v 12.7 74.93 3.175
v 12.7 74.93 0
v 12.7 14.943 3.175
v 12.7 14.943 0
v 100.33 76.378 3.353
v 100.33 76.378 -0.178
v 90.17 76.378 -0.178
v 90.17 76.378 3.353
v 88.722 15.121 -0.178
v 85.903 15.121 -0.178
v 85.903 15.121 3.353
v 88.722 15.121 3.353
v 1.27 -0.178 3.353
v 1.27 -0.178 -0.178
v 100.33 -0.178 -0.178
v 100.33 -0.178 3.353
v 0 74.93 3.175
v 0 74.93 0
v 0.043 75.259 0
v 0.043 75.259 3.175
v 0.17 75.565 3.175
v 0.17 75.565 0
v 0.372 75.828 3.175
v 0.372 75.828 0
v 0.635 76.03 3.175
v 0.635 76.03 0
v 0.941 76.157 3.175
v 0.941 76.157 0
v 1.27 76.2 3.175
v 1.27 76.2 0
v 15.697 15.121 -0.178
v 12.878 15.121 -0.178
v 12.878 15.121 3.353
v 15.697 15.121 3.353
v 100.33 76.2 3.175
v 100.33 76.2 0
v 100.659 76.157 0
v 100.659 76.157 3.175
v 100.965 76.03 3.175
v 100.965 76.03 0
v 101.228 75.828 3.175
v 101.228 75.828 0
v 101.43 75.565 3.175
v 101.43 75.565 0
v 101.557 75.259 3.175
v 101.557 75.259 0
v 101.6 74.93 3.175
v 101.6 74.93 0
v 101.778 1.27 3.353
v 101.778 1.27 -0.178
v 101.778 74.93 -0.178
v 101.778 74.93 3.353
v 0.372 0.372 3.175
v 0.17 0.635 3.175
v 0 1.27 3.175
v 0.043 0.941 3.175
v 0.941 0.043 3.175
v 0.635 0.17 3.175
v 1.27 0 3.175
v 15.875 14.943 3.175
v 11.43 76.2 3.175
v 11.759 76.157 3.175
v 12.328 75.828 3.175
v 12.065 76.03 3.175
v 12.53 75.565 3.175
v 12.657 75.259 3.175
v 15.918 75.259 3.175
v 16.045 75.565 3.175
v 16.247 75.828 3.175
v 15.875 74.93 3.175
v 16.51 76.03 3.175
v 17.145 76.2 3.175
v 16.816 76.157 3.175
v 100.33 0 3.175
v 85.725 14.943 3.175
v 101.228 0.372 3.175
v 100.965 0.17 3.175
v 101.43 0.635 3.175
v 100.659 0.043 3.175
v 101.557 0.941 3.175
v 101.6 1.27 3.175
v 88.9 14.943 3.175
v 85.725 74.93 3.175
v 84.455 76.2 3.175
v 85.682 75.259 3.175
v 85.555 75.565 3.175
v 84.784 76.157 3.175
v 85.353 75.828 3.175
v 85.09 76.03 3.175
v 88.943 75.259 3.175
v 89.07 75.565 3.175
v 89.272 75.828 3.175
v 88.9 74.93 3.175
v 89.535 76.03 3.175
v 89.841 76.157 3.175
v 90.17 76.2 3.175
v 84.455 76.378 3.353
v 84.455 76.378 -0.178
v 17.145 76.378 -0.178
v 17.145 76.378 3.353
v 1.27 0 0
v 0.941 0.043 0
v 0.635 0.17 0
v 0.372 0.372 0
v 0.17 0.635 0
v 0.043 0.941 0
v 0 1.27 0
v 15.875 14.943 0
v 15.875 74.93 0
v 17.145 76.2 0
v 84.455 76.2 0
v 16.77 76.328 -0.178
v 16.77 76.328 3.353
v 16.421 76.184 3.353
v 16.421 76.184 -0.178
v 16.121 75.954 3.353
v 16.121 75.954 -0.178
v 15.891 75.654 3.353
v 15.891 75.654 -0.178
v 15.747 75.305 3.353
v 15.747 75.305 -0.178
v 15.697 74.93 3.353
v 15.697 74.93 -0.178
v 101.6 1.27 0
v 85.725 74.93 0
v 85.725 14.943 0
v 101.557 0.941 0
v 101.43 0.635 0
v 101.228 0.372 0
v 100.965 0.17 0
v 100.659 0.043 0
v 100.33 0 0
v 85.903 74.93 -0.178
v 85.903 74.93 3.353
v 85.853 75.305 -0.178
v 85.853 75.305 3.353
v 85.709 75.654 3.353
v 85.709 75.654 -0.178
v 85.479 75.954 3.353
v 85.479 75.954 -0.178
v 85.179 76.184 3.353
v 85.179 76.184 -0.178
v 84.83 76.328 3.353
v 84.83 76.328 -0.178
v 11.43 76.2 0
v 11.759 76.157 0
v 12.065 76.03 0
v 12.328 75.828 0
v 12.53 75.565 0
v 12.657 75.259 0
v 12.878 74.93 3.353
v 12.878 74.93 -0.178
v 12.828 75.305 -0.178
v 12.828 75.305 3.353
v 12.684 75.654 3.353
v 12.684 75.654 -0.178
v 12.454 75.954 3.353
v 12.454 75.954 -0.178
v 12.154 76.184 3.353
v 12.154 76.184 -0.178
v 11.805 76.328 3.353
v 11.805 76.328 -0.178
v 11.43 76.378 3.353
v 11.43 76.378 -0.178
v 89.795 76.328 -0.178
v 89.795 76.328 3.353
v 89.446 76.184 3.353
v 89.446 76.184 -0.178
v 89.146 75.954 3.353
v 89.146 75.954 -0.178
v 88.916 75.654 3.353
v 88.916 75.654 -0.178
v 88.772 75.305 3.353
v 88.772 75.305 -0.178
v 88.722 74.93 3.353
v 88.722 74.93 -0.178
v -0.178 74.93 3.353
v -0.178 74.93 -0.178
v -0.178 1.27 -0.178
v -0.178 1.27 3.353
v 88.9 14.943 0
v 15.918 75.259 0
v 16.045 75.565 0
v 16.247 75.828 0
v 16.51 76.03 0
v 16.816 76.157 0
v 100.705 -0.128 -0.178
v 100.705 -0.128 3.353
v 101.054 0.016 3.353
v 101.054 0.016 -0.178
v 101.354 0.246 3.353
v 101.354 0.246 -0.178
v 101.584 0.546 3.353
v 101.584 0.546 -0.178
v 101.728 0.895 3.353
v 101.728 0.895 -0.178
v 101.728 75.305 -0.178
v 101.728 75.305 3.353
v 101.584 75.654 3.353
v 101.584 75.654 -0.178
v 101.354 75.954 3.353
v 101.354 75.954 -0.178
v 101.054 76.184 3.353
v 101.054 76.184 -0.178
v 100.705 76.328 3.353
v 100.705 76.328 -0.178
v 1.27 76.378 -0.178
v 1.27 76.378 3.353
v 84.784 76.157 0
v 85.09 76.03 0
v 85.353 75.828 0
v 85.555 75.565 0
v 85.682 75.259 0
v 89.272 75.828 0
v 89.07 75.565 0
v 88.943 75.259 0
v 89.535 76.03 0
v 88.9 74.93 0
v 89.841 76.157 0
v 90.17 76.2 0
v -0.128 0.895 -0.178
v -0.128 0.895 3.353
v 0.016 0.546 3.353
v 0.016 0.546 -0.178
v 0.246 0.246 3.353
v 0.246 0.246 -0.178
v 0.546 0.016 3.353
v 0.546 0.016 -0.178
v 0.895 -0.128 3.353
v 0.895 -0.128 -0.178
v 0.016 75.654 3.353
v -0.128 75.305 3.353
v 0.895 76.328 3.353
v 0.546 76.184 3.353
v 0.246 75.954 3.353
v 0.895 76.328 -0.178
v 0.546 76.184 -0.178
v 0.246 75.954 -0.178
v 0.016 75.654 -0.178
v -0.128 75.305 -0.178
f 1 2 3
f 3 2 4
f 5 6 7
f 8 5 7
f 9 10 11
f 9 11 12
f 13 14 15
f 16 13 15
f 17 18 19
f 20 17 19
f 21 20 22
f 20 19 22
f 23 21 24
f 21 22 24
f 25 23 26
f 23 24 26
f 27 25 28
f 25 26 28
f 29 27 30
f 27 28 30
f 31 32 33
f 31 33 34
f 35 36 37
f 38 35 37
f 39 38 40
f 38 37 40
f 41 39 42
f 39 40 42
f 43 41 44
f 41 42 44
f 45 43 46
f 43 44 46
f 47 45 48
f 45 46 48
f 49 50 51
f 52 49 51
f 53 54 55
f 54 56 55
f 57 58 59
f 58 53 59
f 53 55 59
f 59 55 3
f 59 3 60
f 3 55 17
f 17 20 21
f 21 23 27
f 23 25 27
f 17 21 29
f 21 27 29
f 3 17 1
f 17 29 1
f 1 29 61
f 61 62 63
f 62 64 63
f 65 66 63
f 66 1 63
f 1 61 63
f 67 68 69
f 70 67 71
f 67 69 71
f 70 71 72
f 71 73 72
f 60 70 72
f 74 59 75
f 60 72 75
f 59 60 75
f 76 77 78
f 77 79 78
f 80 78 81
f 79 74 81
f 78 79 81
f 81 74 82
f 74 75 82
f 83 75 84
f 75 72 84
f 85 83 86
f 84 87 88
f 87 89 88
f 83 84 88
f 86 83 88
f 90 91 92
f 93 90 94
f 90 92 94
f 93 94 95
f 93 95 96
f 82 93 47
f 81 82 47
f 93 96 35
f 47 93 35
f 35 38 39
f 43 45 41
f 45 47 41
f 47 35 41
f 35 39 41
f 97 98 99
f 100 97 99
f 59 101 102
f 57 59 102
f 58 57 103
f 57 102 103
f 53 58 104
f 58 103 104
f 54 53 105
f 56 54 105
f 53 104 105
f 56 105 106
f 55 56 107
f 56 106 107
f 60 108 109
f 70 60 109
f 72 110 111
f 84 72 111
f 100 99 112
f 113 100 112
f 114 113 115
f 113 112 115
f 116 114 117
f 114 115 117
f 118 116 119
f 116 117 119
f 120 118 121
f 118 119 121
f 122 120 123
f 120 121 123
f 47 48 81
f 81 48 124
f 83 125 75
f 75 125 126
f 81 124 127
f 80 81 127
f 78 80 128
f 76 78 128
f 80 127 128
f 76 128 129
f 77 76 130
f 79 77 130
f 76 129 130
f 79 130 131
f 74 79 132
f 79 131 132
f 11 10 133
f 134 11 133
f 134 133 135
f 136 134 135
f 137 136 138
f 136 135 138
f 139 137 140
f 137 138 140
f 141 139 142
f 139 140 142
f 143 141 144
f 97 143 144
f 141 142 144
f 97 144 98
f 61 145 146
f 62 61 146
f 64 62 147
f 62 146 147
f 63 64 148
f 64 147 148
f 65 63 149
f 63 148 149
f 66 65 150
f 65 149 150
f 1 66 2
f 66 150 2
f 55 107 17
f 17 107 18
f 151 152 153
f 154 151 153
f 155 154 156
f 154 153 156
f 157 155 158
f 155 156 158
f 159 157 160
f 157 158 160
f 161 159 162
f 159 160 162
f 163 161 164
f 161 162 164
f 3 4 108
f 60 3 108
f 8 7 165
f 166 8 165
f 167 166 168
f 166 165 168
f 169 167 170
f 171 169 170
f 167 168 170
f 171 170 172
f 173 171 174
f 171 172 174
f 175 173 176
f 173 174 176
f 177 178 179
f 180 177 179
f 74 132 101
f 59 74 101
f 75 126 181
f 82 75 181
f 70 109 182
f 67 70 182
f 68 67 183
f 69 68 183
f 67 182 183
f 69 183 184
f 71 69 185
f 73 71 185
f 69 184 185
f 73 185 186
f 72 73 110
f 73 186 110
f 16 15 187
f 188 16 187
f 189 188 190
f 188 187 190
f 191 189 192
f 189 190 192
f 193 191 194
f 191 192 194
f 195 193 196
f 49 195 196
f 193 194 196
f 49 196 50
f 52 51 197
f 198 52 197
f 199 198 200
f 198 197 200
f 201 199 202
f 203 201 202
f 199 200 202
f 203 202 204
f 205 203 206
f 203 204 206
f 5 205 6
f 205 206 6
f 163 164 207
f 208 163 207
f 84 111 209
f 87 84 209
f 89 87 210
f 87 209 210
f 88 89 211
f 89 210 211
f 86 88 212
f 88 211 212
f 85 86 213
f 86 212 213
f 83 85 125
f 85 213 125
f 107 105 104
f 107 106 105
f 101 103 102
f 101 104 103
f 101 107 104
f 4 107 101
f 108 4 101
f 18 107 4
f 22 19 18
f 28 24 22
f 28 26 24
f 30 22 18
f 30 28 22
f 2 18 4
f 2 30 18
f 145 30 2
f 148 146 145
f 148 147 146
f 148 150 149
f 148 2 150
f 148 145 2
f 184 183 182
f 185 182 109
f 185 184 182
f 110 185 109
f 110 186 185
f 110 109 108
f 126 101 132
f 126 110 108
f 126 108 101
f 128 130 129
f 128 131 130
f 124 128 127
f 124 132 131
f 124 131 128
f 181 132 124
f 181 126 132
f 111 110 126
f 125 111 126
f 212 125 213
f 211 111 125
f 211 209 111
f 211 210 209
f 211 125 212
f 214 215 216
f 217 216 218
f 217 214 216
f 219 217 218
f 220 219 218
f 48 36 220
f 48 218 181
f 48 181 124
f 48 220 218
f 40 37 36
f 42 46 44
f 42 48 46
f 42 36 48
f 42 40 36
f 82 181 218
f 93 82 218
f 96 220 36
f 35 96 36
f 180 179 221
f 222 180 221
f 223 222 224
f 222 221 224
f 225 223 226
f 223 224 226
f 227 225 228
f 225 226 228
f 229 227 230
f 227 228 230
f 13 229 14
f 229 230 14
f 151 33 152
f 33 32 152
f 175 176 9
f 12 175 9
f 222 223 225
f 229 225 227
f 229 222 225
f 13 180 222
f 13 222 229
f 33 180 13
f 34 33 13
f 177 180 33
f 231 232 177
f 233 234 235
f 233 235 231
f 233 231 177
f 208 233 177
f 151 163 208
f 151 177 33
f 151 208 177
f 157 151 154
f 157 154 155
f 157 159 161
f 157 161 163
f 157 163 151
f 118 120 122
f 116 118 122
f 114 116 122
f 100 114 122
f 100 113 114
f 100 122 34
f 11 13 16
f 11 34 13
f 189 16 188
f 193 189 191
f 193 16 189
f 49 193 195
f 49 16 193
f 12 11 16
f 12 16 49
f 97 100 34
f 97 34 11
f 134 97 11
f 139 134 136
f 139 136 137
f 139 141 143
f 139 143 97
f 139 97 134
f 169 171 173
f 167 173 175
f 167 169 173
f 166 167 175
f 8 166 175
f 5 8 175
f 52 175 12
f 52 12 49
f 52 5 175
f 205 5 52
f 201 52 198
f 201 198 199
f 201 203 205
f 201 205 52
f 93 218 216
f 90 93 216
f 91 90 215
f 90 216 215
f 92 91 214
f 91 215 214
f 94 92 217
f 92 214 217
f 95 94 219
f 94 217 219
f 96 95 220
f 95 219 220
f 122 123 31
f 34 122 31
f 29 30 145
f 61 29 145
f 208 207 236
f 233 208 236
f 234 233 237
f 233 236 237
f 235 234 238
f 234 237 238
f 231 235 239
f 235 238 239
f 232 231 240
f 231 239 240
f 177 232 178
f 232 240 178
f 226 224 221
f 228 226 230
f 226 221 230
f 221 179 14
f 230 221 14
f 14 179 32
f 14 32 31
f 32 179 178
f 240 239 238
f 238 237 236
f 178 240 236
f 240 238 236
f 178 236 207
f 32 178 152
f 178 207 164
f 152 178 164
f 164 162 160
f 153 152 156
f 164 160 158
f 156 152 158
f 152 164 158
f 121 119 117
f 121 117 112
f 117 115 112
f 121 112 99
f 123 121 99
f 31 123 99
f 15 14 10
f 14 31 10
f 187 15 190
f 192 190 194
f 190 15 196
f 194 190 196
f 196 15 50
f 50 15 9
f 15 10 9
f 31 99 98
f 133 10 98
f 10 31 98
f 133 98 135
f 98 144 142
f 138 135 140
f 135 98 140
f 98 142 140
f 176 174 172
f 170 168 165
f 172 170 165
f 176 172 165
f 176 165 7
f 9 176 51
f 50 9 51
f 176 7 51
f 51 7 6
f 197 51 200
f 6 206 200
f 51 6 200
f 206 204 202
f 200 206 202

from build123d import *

# Parameters (mm, degrees)
BOSS_EXTRUDE1_DEPTH = 3.175
FILLET5_R           = 1.27
SHELL2_START        = -0.1778
SHELL2_OUTLINE_W    = 75.8444
SHELL2_OUTLINE_H    = 3.5306
SHELL2_DEPTH        = 0.1778
SHELL2_START_2      = 14.942805851
SHELL2_2_OUTLINE_W  = 2.8194
SHELL2_2_OUTLINE_H  = 3.5306
SHELL2_2_DEPTH      = 0.1778
SHELL2_3_DEPTH      = 3.175
SHELL2_4_DEPTH      = 0.1778
SHELL2_START_3      = 3.175
SHELL2_5_DEPTH      = 0.1778
SHELL2_6_DEPTH      = 3.5306


with BuildPart() as part:
    # Sketch1 → Boss-Extrude1 (new body)
    with BuildSketch(Plane.XY):
        Polygon((50.8, 0), (50.8, 76.2), (15.875, 76.2), (15.875, 14.942805851), (12.7, 14.942805851), (12.7, 76.2), (0, 76.2), (0, 0), align=None)
        Polygon((85.725, 76.2), (50.8, 76.2), (50.8, 0), (101.6, 0), (101.6, 76.2), (88.9, 76.2), (88.9, 14.942805851), (85.725, 14.942805851), align=None)
    extrude(amount=BOSS_EXTRUDE1_DEPTH)

    # Fillet5
    fillet5_edges = [part.edges().sort_by_distance(p)[0] for p in [
        (0, 0, 1.5875),
        (0, 76.2, 1.5875),
        (12.7, 76.2, 1.5875),
        (15.875, 76.2, 1.5875),
        (85.725, 76.2, 1.5875),
        (88.9, 76.2, 1.5875),
        (101.6, 76.2, 1.5875),
        (101.6, 0, 1.5875),
    ]]
    fillet(fillet5_edges, radius=FILLET5_R)

    # Shell2: read off the stored shape, not the designer's step
    # Shell2 outline → Shell2 (add)
    with BuildSketch(Plane(origin=(0, 0, 0), x_dir=(1, 0, 0), z_dir=(0, 1, 0)).offset(SHELL2_START)):
        with Locations((50.8, -1.5875)):
            Rectangle(SHELL2_OUTLINE_W, SHELL2_OUTLINE_H)
    extrude(amount=SHELL2_DEPTH)

    # Shell2 2 outline → Shell2 2 (add)
    with BuildSketch(Plane(origin=(0, 0, 0), x_dir=(1, 0, 0), z_dir=(0, 1, 0)).offset(SHELL2_START_2)):
        with Locations((87.3125, -1.5875)):
            Rectangle(SHELL2_2_OUTLINE_W, SHELL2_2_OUTLINE_H)
        with Locations((14.2875, -1.5875)):
            Rectangle(SHELL2_2_OUTLINE_W, SHELL2_2_OUTLINE_H)
    extrude(amount=SHELL2_2_DEPTH)

    # Shell2 3 outline → Shell2 3 (cut)
    with BuildSketch(Plane.XY):
        with BuildLine():
            Line((1.27, 0), (100.33, 0))
            ThreePointArc((100.33, 0), (101.228025612, 0.371974388), (101.6, 1.27))
            Line((101.6, 1.27), (101.6, 74.93))
            ThreePointArc((101.6, 74.93), (101.228025612, 75.828025612), (100.33, 76.2))
            Line((100.33, 76.2), (90.17, 76.2))
            ThreePointArc((90.17, 76.2), (89.271974388, 75.828025612), (88.9, 74.93))
            Line((88.9, 74.93), (88.9, 14.942805851))
            Line((88.9, 14.942805851), (85.725, 14.942805851))
            Line((85.725, 14.942805851), (85.725, 74.93))
            ThreePointArc((85.725, 74.93), (85.353025612, 75.828025612), (84.455, 76.2))
            Line((84.455, 76.2), (17.145, 76.2))
            ThreePointArc((17.145, 76.2), (16.246974388, 75.828025612), (15.875, 74.93))
            Line((15.875, 74.93), (15.875, 14.942805851))
            Line((15.875, 14.942805851), (12.7, 14.942805851))
            Line((12.7, 14.942805851), (12.7, 74.93))
            ThreePointArc((12.7, 74.93), (12.328025612, 75.828025612), (11.43, 76.2))
            Line((11.43, 76.2), (1.27, 76.2))
            ThreePointArc((1.27, 76.2), (0.371974388, 75.828025612), (0, 74.93))
            Line((0, 74.93), (0, 1.27))
            ThreePointArc((0, 1.27), (0.371974388, 0.371974388), (1.27, 0))
        make_face()
    extrude(amount=SHELL2_3_DEPTH, mode=Mode.SUBTRACT)

    # Shell2 4 outline → Shell2 4 (add)
    with BuildSketch(Plane.XY.offset(SHELL2_START)):
        with BuildLine():
            Line((88.7222, -0.1778), (100.33, -0.1778))
            ThreePointArc((100.33, -0.1778), (101.353749198, 0.246250802), (101.7778, 1.27))
            Line((101.7778, 1.27), (101.7778, 74.93))
            ThreePointArc((101.7778, 74.93), (101.353749198, 75.953749198), (100.33, 76.3778))
            Line((100.33, 76.3778), (90.17, 76.3778))
            ThreePointArc((90.17, 76.3778), (89.146250802, 75.953749198), (88.7222, 74.93))
            Line((88.7222, 74.93), (88.7222, 14.942805851))
            Line((88.7222, 14.942805851), (85.9028, 14.942805851))
            Line((85.9028, 14.942805851), (85.9028, 74.93))
            ThreePointArc((85.9028, 74.93), (85.478749198, 75.953749198), (84.455, 76.3778))
            Line((84.455, 76.3778), (17.145, 76.3778))
            ThreePointArc((17.145, 76.3778), (16.121250802, 75.953749198), (15.6972, 74.93))
            Line((15.6972, 74.93), (15.6972, 14.942805851))
            Line((15.6972, 14.942805851), (12.8778, 14.942805851))
            Line((12.8778, 14.942805851), (12.8778, 74.93))
            ThreePointArc((12.8778, 74.93), (12.453749198, 75.953749198), (11.43, 76.3778))
            Line((11.43, 76.3778), (1.27, 76.3778))
            ThreePointArc((1.27, 76.3778), (0.246250802, 75.953749198), (-0.1778, 74.93))
            Line((-0.1778, 74.93), (-0.1778, 1.27))
            ThreePointArc((-0.1778, 1.27), (0.246250802, 0.246250802), (1.27, -0.1778))
            Line((1.27, -0.1778), (12.8778, -0.1778))
            Line((12.8778, -0.1778), (12.8778, 0))
            Line((12.8778, 0), (88.7222, 0))
            Line((88.7222, 0), (88.7222, -0.1778))
        make_face()
    extrude(amount=SHELL2_4_DEPTH)

    # Shell2 5 outline → Shell2 5 (add)
    with BuildSketch(Plane.XY.offset(SHELL2_START_3)):
        with BuildLine():
            Line((88.7222, -0.1778), (100.33, -0.1778))
            ThreePointArc((100.33, -0.1778), (101.353749198, 0.246250802), (101.7778, 1.27))
            Line((101.7778, 1.27), (101.7778, 74.93))
            ThreePointArc((101.7778, 74.93), (101.353749198, 75.953749198), (100.33, 76.3778))
            Line((100.33, 76.3778), (90.17, 76.3778))
            ThreePointArc((90.17, 76.3778), (89.146250802, 75.953749198), (88.7222, 74.93))
            Line((88.7222, 74.93), (88.7222, 14.942805851))
            Line((88.7222, 14.942805851), (85.9028, 14.942805851))
            Line((85.9028, 14.942805851), (85.9028, 74.93))
            ThreePointArc((85.9028, 74.93), (85.478749198, 75.953749198), (84.455, 76.3778))
            Line((84.455, 76.3778), (17.145, 76.3778))
            ThreePointArc((17.145, 76.3778), (16.121250802, 75.953749198), (15.6972, 74.93))
            Line((15.6972, 74.93), (15.6972, 14.942805851))
            Line((15.6972, 14.942805851), (12.8778, 14.942805851))
            Line((12.8778, 14.942805851), (12.8778, 74.93))
            ThreePointArc((12.8778, 74.93), (12.453749198, 75.953749198), (11.43, 76.3778))
            Line((11.43, 76.3778), (1.27, 76.3778))
            ThreePointArc((1.27, 76.3778), (0.246250802, 75.953749198), (-0.1778, 74.93))
            Line((-0.1778, 74.93), (-0.1778, 1.27))
            ThreePointArc((-0.1778, 1.27), (0.246250802, 0.246250802), (1.27, -0.1778))
            Line((1.27, -0.1778), (12.8778, -0.1778))
            Line((12.8778, -0.1778), (12.8778, 0))
            Line((12.8778, 0), (88.7222, 0))
            Line((88.7222, 0), (88.7222, -0.1778))
        make_face()
    extrude(amount=SHELL2_5_DEPTH)

    # Shell2 6 outline → Shell2 6 (add)
    with BuildSketch(Plane.XY.offset(SHELL2_START)):
        with BuildLine():
            Line((88.7222, -0.1778), (100.33, -0.1778))
            ThreePointArc((100.33, -0.1778), (101.353749198, 0.246250802), (101.7778, 1.27))
            Line((101.7778, 1.27), (101.7778, 74.93))
            ThreePointArc((101.7778, 74.93), (101.353749198, 75.953749198), (100.33, 76.3778))
            Line((100.33, 76.3778), (90.17, 76.3778))
            ThreePointArc((90.17, 76.3778), (89.146250802, 75.953749198), (88.7222, 74.93))
            Line((88.7222, 74.93), (88.7222, 14.942805851))
            Line((88.7222, 14.942805851), (88.9, 14.942805851))
            Line((88.9, 14.942805851), (88.9, 74.93))
            ThreePointArc((88.9, 74.93), (89.271974388, 75.828025612), (90.17, 76.2))
            Line((90.17, 76.2), (100.33, 76.2))
            ThreePointArc((100.33, 76.2), (101.228025612, 75.828025612), (101.6, 74.93))
            Line((101.6, 74.93), (101.6, 1.27))
            ThreePointArc((101.6, 1.27), (101.228025612, 0.371974388), (100.33, 0))
            Line((100.33, 0), (88.7222, 0))
            Line((88.7222, 0), (88.7222, -0.1778))
        make_face()
        with BuildLine():
            Line((1.27, -0.1778), (12.8778, -0.1778))
            Line((12.8778, -0.1778), (12.8778, 0))
            Line((12.8778, 0), (1.27, 0))
            ThreePointArc((1.27, 0), (0.371974388, 0.371974388), (0, 1.27))
            Line((0, 1.27), (0, 74.93))
            ThreePointArc((0, 74.93), (0.371974388, 75.828025612), (1.27, 76.2))
            Line((1.27, 76.2), (11.43, 76.2))
            ThreePointArc((11.43, 76.2), (12.328025612, 75.828025612), (12.7, 74.93))
            Line((12.7, 74.93), (12.7, 14.942805851))
            Line((12.7, 14.942805851), (12.8778, 14.942805851))
            Line((12.8778, 14.942805851), (12.8778, 74.93))
            ThreePointArc((12.8778, 74.93), (12.453749198, 75.953749198), (11.43, 76.3778))
            Line((11.43, 76.3778), (1.27, 76.3778))
            ThreePointArc((1.27, 76.3778), (0.246250802, 75.953749198), (-0.1778, 74.93))
            Line((-0.1778, 74.93), (-0.1778, 1.27))
            ThreePointArc((-0.1778, 1.27), (0.246250802, 0.246250802), (1.27, -0.1778))
        make_face()
        with BuildLine():
            Line((85.725, 14.942805851), (85.9028, 14.942805851))
            Line((85.9028, 14.942805851), (85.9028, 74.93))
            ThreePointArc((85.9028, 74.93), (85.478749198, 75.953749198), (84.455, 76.3778))
            Line((84.455, 76.3778), (17.145, 76.3778))
            ThreePointArc((17.145, 76.3778), (16.121250802, 75.953749198), (15.6972, 74.93))
            Line((15.6972, 74.93), (15.6972, 14.942805851))
            Line((15.6972, 14.942805851), (15.875, 14.942805851))
            Line((15.875, 14.942805851), (15.875, 74.93))
            ThreePointArc((15.875, 74.93), (16.246974388, 75.828025612), (17.145, 76.2))
            Line((17.145, 76.2), (84.455, 76.2))
            ThreePointArc((84.455, 76.2), (85.353025612, 75.828025612), (85.725, 74.93))
            Line((85.725, 74.93), (85.725, 14.942805851))
        make_face()
    extrude(amount=SHELL2_6_DEPTH)


solid = part.part
